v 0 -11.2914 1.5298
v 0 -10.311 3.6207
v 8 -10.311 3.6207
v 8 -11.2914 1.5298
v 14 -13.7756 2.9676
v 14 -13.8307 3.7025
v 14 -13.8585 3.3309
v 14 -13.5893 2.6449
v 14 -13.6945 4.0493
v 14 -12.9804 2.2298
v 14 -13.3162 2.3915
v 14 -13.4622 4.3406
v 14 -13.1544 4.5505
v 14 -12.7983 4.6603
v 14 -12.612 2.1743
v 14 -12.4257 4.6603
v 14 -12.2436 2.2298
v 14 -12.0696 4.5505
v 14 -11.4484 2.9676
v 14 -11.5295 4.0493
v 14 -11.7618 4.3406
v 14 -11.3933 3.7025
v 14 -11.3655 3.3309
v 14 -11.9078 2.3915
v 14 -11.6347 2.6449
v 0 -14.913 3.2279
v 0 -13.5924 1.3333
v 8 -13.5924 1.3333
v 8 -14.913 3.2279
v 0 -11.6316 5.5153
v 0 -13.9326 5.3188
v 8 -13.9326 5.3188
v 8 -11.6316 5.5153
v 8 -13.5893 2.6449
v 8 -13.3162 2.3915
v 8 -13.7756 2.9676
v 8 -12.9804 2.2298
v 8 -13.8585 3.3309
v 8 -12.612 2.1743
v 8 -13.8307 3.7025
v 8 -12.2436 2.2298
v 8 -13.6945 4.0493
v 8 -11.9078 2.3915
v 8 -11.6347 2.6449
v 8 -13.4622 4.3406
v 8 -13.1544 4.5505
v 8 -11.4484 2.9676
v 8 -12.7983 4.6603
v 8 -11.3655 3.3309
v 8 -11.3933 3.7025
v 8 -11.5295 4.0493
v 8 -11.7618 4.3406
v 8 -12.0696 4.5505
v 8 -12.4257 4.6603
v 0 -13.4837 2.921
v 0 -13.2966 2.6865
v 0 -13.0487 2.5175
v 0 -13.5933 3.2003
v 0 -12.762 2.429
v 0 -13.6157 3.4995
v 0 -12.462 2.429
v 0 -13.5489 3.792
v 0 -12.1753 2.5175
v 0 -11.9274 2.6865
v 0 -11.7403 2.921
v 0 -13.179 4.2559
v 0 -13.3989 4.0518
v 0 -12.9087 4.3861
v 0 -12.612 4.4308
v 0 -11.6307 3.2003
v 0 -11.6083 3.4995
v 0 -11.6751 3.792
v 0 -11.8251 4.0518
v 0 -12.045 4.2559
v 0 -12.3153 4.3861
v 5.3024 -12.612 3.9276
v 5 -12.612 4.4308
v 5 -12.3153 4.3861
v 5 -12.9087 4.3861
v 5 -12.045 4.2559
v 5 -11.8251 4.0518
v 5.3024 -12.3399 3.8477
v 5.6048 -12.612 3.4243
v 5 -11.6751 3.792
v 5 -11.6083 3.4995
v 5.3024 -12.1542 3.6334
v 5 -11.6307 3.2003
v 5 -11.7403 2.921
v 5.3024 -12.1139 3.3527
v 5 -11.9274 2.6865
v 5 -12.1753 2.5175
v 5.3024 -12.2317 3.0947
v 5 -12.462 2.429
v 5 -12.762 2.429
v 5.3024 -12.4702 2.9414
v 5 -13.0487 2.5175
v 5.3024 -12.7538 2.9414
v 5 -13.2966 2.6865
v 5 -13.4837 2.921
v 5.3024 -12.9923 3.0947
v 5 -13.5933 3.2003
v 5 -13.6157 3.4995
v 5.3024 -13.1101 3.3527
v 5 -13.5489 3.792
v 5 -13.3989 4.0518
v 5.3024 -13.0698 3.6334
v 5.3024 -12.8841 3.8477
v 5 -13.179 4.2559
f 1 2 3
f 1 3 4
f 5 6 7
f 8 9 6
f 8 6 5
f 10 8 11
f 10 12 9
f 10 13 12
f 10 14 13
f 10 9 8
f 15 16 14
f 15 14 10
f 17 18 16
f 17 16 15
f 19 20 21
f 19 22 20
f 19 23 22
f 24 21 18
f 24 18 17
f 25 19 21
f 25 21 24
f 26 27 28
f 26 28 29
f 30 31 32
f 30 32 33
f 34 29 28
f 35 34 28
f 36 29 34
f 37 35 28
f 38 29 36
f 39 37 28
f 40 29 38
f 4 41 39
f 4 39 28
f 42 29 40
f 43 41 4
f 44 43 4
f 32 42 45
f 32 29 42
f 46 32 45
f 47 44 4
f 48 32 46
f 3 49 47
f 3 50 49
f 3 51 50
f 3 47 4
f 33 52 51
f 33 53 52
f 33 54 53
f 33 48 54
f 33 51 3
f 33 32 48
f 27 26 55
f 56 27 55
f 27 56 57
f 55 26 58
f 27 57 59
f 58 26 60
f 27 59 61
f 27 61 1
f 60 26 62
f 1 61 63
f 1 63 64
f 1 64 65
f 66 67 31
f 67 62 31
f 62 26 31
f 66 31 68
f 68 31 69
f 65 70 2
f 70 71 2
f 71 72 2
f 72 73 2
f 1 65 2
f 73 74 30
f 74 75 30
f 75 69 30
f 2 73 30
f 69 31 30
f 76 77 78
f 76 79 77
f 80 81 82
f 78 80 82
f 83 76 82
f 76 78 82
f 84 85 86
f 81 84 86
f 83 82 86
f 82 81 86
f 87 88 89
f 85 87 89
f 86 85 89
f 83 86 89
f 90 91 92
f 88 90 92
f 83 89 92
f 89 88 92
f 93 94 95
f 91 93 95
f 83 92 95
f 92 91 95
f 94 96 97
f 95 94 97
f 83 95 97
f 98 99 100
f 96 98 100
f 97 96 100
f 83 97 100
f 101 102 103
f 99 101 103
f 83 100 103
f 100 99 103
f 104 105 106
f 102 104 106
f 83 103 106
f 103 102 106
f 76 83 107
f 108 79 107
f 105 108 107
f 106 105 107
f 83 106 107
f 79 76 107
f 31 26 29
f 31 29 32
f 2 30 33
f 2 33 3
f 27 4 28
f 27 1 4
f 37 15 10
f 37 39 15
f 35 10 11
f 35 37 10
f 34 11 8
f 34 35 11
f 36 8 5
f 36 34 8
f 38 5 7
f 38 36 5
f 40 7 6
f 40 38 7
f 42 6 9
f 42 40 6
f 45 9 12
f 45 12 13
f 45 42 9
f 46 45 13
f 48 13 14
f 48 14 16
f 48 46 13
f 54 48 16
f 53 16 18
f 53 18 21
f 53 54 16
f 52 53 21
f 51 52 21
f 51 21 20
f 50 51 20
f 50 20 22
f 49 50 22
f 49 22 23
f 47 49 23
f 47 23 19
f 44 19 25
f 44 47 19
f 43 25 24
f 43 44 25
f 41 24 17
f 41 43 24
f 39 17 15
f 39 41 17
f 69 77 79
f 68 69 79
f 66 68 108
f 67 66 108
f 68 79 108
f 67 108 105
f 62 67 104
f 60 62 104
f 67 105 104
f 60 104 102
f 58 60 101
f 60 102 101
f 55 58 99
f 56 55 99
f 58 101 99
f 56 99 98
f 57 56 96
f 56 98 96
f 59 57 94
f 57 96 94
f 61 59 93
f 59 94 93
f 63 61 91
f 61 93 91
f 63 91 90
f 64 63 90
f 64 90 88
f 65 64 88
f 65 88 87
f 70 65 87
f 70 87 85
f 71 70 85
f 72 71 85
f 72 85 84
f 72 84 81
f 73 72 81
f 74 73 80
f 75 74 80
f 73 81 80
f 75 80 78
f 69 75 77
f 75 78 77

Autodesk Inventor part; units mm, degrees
ref_plane "YZ Plane" through (0, 0, 0) normal (1, 0, 0) x (0, 1, 0)
ref_plane "XZ Plane" through (0, 0, 0) normal (0, 1, 0) x (-1, 0, 0)
ref_plane "XY Plane" through (0, 0, 0) normal (0, 0, 1) x (1, 0, 0)
sketch "Sketch1" plane through (0, 0, 0) normal (1, 0, 0) x (0, 1, 0)
  line L0 (-10.311, 3.6207) -> (-11.2914, 1.5298)
  line L1 (-11.2914, 1.5298) -> (-13.5924, 1.3333)
  line L2 (-13.5924, 1.3333) -> (-14.913, 3.2279)
  line L3 (-14.913, 3.2279) -> (-13.9326, 5.3188)
  line L4 (-13.9326, 5.3188) -> (-11.6316, 5.5153)
  line L5 (-11.6316, 5.5153) -> (-10.311, 3.6207)
  point P0 (0, 0)
  point P1 (-12.612, 3.4243)
  dimension "d0" = 2
extrude "Extrusion1" add sketch "Sketch1" along normal blind 8
sketch "Sketch2" plane through (8, 0, 0) normal (1, 0, 0) x (0, 0, -1)
  line L0 (-3.6207, -10.311) -> (-5.5153, -11.6316) projected
  line L1 (-3.2279, -14.913) -> (-1.3333, -13.5924) projected
  line L2 (-4.568, -10.9713) -> (-2.2806, -14.2527)
  circle A0 centre (-3.4243, -12.612) radius 1.25
  point P0 (0, 0)
  dimension "d3" = 2.5
extrude "Extrusion2" add sketch "Sketch2" along normal blind 6
thread "Thread1" size "M2.5x0.45" class "6g" standard "ANSI Metric M Profile" full length
sketch "Sketch3" plane through (0, 0, 0) normal (-1, 0, 0) x (0, 0, 1)
  line L0 (1.3333, -13.5924) -> (3.2279, -14.913) projected
  line L1 (5.5153, -11.6316) -> (3.6207, -10.311) projected
  line L2 (4.568, -10.9713) -> (2.2806, -14.2527)
  point P0 (0, 0)
  point P1 (3.4243, -12.612)
hole "Hole1" at (0, -12.612, 3.4243) direction (1, 0, 0) diameter 2.013 depth 5 tip angle 118 thread size "M2.5x0.45" class "6H" standard "ANSI Metric M Profile"
properties part number "standoff" material "Brass, Soft Yellow"
